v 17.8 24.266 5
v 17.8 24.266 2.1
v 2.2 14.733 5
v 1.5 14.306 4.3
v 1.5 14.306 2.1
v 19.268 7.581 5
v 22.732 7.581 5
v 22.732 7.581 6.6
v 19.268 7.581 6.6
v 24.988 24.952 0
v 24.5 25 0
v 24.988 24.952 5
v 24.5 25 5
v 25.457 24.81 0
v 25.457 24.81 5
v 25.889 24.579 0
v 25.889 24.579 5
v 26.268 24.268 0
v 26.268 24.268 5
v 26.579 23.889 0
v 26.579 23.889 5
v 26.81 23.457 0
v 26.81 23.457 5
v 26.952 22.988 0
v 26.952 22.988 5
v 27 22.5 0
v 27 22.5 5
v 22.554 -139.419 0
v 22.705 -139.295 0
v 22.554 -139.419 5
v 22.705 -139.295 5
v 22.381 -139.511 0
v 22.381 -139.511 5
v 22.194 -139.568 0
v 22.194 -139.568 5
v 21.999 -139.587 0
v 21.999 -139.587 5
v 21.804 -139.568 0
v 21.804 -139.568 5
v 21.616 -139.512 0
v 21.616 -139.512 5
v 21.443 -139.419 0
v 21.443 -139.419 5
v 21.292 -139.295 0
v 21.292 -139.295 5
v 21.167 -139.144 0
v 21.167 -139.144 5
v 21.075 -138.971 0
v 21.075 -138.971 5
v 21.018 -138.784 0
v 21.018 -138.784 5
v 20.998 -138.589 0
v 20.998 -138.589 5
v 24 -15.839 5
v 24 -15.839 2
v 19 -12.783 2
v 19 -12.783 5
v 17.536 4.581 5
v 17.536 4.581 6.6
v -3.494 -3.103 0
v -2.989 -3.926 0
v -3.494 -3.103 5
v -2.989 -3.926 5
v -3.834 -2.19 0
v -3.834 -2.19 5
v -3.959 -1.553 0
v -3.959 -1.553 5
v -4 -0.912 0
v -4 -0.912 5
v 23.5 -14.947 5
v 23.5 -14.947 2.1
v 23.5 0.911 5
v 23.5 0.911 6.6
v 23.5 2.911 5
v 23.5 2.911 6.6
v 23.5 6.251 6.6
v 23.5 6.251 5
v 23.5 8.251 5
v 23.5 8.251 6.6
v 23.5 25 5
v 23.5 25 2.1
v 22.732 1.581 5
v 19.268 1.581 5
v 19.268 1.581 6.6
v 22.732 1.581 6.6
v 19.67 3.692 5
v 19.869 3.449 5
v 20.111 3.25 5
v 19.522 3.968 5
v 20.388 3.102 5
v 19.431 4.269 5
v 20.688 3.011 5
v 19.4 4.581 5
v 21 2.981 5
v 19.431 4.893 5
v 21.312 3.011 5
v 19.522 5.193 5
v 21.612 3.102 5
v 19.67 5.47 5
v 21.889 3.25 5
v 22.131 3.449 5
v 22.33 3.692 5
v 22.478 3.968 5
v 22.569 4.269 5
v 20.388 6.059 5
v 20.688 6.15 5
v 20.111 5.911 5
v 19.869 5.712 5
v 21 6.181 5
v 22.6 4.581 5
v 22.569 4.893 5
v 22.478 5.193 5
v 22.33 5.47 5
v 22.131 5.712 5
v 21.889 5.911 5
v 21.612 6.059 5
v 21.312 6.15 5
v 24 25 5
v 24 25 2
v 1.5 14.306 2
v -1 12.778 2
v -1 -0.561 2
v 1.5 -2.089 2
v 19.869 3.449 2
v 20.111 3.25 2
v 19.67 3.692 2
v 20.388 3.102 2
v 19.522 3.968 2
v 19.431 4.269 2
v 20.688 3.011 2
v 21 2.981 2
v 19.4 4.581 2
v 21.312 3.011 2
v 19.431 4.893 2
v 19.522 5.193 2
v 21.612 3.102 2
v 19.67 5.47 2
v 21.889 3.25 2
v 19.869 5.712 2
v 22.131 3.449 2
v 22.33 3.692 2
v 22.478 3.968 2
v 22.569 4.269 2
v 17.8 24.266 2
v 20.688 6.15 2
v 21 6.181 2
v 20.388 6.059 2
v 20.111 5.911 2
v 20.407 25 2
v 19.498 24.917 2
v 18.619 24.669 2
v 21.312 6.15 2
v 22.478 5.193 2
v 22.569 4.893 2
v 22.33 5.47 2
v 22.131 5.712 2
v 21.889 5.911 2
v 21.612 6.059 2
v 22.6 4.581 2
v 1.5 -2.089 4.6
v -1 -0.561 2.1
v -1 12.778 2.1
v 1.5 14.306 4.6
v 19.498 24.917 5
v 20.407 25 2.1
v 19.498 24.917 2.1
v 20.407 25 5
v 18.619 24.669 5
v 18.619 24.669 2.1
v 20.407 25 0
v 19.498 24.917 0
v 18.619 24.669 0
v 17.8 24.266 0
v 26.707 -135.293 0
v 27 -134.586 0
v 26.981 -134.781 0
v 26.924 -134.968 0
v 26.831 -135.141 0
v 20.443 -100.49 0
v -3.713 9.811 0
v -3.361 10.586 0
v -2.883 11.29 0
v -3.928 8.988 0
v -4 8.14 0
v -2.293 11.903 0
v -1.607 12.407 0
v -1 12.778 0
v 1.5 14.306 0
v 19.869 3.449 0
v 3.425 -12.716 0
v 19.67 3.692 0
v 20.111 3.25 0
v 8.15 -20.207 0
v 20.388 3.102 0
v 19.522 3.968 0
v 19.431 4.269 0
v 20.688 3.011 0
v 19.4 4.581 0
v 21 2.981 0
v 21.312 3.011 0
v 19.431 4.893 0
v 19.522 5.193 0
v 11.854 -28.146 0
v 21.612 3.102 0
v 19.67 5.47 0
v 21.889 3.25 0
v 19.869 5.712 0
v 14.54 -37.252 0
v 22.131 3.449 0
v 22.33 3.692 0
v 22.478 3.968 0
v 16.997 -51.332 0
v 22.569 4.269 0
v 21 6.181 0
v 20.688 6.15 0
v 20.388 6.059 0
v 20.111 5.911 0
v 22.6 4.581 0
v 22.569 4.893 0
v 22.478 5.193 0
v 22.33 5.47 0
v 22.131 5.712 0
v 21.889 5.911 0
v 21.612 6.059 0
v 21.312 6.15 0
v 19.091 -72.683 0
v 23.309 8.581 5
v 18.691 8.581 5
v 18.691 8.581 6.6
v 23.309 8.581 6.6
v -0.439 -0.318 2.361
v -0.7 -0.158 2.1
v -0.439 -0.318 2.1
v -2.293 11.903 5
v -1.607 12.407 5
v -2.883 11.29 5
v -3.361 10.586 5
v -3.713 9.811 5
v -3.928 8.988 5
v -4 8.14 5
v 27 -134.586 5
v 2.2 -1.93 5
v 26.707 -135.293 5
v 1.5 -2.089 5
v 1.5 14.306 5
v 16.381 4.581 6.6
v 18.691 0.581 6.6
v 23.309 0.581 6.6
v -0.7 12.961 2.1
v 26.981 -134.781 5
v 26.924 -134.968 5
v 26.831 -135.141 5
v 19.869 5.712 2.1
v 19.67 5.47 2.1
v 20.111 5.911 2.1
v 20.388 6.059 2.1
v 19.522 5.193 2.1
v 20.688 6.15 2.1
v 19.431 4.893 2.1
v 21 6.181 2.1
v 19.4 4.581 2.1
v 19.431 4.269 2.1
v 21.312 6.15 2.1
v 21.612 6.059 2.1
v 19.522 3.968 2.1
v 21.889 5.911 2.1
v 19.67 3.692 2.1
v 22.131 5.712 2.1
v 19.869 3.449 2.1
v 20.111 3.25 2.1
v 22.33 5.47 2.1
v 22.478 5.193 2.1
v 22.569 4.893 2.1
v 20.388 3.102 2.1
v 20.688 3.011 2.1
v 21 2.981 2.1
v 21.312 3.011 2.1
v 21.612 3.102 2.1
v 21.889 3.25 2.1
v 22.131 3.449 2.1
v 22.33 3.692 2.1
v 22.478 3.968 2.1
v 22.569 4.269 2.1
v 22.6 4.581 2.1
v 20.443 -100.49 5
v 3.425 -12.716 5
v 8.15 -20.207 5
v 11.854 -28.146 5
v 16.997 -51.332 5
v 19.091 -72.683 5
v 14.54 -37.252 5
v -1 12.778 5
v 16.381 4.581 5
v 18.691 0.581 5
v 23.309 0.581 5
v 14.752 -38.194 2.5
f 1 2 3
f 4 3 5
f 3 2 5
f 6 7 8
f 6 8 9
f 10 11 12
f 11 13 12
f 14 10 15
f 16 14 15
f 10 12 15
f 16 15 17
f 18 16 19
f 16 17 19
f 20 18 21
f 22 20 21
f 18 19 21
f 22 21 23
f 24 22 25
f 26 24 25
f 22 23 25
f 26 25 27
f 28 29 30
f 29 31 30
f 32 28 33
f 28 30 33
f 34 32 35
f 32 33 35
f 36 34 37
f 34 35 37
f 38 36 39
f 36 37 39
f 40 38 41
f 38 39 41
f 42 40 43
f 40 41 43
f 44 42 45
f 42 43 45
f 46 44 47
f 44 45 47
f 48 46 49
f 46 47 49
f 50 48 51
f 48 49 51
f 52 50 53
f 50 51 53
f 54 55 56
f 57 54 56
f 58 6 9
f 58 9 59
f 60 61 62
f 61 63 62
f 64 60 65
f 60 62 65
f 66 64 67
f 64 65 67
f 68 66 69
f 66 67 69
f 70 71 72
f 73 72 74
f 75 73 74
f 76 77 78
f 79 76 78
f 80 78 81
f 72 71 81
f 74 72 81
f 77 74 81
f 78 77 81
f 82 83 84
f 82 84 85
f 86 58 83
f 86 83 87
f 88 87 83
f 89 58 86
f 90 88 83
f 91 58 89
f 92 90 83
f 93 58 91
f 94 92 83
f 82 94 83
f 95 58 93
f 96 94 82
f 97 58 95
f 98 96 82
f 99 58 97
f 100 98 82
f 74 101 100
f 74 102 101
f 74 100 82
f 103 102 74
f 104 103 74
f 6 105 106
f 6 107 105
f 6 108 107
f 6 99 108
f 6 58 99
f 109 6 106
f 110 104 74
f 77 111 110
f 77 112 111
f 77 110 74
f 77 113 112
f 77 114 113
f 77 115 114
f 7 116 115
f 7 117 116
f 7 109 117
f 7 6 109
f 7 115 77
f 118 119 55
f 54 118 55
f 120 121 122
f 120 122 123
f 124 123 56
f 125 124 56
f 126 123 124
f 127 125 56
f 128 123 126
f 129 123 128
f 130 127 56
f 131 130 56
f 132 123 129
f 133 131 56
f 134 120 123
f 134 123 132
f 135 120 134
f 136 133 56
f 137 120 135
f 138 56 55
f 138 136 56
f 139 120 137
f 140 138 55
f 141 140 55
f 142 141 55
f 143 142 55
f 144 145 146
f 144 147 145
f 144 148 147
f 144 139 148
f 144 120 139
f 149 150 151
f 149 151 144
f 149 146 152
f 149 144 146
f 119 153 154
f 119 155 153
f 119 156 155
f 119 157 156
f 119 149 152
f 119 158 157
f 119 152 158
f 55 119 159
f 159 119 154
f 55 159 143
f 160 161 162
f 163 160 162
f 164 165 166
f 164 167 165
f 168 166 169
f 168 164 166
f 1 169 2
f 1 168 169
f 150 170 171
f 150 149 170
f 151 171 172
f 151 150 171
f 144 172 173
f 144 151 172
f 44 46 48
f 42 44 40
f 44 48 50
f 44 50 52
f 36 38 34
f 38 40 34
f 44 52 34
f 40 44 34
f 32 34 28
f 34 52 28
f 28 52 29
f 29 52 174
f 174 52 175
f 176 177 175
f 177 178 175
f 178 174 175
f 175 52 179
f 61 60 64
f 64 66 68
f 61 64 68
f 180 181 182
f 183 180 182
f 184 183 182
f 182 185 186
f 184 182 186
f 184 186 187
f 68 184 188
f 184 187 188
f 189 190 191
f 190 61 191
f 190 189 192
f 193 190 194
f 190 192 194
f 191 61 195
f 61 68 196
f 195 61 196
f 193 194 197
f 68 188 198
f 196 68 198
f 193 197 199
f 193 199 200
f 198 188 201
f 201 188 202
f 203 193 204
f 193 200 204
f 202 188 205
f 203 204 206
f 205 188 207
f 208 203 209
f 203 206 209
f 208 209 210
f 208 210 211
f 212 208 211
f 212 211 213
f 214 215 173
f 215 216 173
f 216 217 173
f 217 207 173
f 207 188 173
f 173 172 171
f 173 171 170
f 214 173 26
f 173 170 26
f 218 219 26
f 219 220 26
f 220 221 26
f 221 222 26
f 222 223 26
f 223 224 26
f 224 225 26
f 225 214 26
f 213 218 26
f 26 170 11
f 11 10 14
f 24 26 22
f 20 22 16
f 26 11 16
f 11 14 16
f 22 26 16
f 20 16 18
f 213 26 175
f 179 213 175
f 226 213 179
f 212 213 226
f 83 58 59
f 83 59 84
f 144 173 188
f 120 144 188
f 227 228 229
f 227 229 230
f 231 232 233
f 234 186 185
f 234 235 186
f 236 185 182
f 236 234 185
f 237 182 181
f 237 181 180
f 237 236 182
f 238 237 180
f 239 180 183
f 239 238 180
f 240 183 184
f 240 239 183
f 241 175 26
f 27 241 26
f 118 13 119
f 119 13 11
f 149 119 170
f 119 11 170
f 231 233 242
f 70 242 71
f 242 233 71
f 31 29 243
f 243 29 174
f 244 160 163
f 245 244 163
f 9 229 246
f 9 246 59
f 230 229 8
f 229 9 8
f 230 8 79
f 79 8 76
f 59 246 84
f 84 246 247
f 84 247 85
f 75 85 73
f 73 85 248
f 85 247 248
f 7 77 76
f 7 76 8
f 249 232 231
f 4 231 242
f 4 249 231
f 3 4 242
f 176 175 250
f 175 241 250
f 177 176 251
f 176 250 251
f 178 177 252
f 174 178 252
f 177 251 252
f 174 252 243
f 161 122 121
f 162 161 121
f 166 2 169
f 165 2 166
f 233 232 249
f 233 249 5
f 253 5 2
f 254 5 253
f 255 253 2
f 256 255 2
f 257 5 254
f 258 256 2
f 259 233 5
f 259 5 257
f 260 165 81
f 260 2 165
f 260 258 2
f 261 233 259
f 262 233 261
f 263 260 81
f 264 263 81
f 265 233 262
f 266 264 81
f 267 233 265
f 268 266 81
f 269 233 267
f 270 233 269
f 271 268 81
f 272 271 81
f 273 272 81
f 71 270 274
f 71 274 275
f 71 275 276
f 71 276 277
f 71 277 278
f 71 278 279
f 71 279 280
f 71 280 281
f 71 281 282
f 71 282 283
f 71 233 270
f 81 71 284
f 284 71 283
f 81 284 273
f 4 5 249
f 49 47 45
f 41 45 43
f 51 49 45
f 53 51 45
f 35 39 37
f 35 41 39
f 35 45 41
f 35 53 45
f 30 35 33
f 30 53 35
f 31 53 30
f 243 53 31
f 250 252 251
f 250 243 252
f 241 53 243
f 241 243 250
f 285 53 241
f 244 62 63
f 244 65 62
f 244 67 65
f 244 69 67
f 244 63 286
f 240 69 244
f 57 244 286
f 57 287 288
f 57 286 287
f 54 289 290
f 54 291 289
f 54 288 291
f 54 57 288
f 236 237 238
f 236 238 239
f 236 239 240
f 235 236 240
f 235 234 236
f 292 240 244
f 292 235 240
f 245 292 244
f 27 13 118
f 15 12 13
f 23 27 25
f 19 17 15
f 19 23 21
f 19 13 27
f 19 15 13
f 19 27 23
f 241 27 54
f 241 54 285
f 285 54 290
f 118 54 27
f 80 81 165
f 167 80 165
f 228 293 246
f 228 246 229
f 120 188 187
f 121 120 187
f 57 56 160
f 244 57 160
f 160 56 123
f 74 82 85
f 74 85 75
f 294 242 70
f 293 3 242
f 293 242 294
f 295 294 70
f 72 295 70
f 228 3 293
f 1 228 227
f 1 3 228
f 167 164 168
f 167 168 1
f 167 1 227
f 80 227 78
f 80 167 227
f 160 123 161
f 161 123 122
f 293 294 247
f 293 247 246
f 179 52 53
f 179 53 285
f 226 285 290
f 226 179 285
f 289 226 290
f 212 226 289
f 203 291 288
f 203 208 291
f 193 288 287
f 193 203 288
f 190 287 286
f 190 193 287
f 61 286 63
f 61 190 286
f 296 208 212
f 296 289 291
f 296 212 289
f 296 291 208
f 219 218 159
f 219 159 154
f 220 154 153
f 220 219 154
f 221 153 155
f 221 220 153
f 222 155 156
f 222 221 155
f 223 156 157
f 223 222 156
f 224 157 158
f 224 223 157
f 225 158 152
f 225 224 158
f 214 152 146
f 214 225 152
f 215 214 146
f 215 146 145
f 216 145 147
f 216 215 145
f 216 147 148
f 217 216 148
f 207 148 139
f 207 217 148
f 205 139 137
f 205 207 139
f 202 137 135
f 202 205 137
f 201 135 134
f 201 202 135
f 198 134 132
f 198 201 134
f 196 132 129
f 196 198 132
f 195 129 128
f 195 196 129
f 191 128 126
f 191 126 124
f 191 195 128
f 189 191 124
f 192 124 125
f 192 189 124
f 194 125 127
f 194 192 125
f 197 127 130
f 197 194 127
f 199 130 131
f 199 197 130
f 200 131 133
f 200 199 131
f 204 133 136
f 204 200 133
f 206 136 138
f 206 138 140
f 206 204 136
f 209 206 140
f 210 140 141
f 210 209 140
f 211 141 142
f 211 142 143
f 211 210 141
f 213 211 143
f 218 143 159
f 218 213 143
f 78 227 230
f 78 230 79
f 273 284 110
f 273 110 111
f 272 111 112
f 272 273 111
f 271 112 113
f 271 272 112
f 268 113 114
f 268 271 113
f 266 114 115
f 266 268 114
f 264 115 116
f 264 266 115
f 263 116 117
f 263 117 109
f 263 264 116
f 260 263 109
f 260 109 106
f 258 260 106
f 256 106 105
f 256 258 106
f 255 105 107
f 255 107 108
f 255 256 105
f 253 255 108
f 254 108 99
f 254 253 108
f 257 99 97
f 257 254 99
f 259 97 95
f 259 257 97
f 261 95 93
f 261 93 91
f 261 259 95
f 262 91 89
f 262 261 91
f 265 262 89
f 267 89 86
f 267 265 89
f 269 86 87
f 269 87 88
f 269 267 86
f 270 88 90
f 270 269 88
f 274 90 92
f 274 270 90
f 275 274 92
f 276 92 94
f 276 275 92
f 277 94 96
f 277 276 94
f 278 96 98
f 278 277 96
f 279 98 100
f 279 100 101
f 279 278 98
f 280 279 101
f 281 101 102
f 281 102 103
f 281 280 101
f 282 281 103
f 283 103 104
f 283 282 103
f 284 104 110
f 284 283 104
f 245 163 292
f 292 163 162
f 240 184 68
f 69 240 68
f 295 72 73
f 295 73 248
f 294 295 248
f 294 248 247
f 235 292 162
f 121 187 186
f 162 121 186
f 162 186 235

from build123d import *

# Parameters (mm, degrees)
F0_R        = 1.6
F1_DEPTH    = 2
F2_DEPTH    = 5
F3_START    = 2.1
F3_DEPTH    = 2.9
F4_SIZE     = 2.49999
F5_R        = 5
F6_R        = 2.5
F7_R        = 1
F8_START    = 2.1
F8_DEPTH    = 2.9
F9_T1_DEPTH = 29.797383518
F11_DEPTH   = 2.9
F12_DEPTH   = 4.5
F13_R       = 5


# Not quite as in the source:
# - a fillet or chamfer that OpenCascade refuses, or shapes differently, is made with other operations: its cross-section is extruded or revolved along the edge and cut away or added
# - a fillet or chamfer is up to 0.001 mm smaller than in the source, because OpenCascade refuses the exact size


with BuildPart() as f1:
    # F0 (on Top) → F1 (new body)
    with BuildSketch(Plane.XY):
        Polygon((1.5, 14.3055555556), (1.5, -2.088612395), (19, -12.7830568394), (24, -15.838612395), (24, 25), (19, 25), align=None)
        with Locations((21, 4.5806938025)):
            Circle(F0_R, mode=Mode.SUBTRACT)
        Polygon((-1, 12.7777777778), (-1, -0.5608346172), (1.5, -2.088612395), (1.5, 14.3055555556), align=None)
    extrude(amount=F1_DEPTH)

    # F0 (on Top) → F2 (join)
    with BuildSketch(Plane.XY):
        with BuildLine():
            Line((1.5, -2.088612395), (-1, -0.5608346172))
            Line((-1, -0.5608346172), (-1, 12.7777777778))
            Line((-1, 12.7777777778), (-4, 10.9444444444))
            Line((-4, 10.9444444444), (-4, -2.5923480172))
            add(Edge.make_bspline(
                [(21, -141), (21, -99.5346466722), (18.6902447603, -35.5134267653), (7.388175394, -17.5804150979), (-4, -2.5923480172)],
                knots=[0, 0, 0, 0, 0.6153681888, 1, 1, 1, 1], degree=3))
            Line((21, -141), (27, -135))
            Line((27, -135), (27, 25))
            Line((27, 25), (24, 25))
            Line((24, 25), (24, -15.838612395))
            Line((24, -15.838612395), (19, -12.7830568394))
            Line((19, -12.7830568394), (1.5, -2.088612395))
        make_face()
    extrude(amount=F2_DEPTH)

    # F0 (on Top) → F3 (join)
    with BuildSketch(Plane.XY.offset(F3_START)):
        Polygon((-1, 12.7777777778), (-1, -0.5608346172), (1.5, -2.088612395), (1.5, 14.3055555556), align=None)
    extrude(amount=F3_DEPTH)

    # F4 (size 2.5 in the source; OpenCascade refuses exactly that, so slightly less here)
    f4_edges = [f1.edges().sort_by_distance(p)[0] for p in [
        (1.5, 6.108472, 2.1),
    ]]
    chamfer(f4_edges, length=F4_SIZE)

    # F5
    f5_edges = [f1.edges().sort_by_distance(p)[0] for p in [
        (-4, 10.944444, 2.5),
        (19, 25, 1),
        (-4, -2.592348, 2.5),
    ]]
    fillet(f5_edges, radius=F5_R)

    # F6
    f6_edges = [f1.edges().sort_by_distance(p)[0] for p in [
        (27, 25, 2.5),
    ]]
    fillet(f6_edges, radius=F6_R)

    # F7
    f7_edges = [f1.edges().sort_by_distance(p)[0] for p in [
        (27, -135, 2.5),
        (21, -141, 2.5),
    ]]
    fillet(f7_edges, radius=F7_R)


with BuildPart() as f8:
    # F0 (on Top) → F8 (new body)
    with BuildSketch(Plane.XY.offset(F8_START)):
        Polygon((-1, 12.7777777778), (-1, -0.5608346172), (1.5, -2.088612395), (1.5, 14.3055555556), align=None)
        Polygon((1.5, 14.3055555556), (1.5, -2.088612395), (19, -12.7830568394), (24, -15.838612395), (24, 25), (19, 25), align=None)
        with Locations((21, 4.5806938025)):
            Circle(F0_R, mode=Mode.SUBTRACT)
    extrude(amount=F8_DEPTH)

    # F9: chamfer of 3.2 on 1 edges, made by hand

    # F9_s2 → F9_t1 (cut)
    with BuildSketch(Plane.XZ.offset(-21.0071633393)):
        Polygon((-1, 1.8), (2.2, 5), (-1, 5), align=None)
    extrude(amount=F9_T1_DEPTH, mode=Mode.SUBTRACT)

    # F10 (on face) → F11 (cut, through all)
    with BuildSketch(Plane(origin=(0, 0, 2.1), x_dir=(1, 0, 0), z_dir=(0, 0, -1))):
        Polygon((24, -1.7768462252), (24, 15.838612395), (-0.7, 0.7441679505), (-0.7, 0.1581950864), (-0.4392749953, 0.3175270337), (23.5, 14.9470839753), (23.5, -0.9108208214), align=None)
        Polygon((24, -25), (24, -7.3845413798), (23.5, -8.2505667836), (23.5, -25), align=None)
        Polygon((24, -3.7768462252), (24, -1.7768462252), (23.5, -0.9108208214), (23.5, -2.9108208214), align=None)
        Polygon((24, -7.3845413798), (24, -5.3845413798), (23.5, -6.2505667836), (23.5, -8.2505667836), align=None)
        Polygon((24, -5.3845413798), (24, -3.7768462252), (23.5, -2.9108208214), (23.5, -6.2505667836), align=None)
    extrude(amount=-F11_DEPTH, mode=Mode.SUBTRACT)

    # F10 (on face) → F12 (join)
    with BuildSketch(Plane(origin=(0, 0, 2.1), x_dir=(1, 0, 0), z_dir=(0, 0, -1))):
        Polygon((23.5, -2.9108208214), (23.5, -0.9108208214), (23.3094010768, -0.5806938025), (18.6905989232, -0.5806938025), (16.3811978465, -4.5806938025), (18.6905989232, -8.5806938025), (23.3094010768, -8.5806938025), (23.5, -8.2505667836), (23.5, -6.2505667836), (22.7320508076, -7.5806938025), (19.2679491924, -7.5806938025), (17.5358983849, -4.5806938025), (19.2679491924, -1.5806938025), (22.7320508076, -1.5806938025), align=None)
    extrude(amount=-F12_DEPTH)

    # F13
    f13_edges = [f8.edges().sort_by_distance(p)[0] for p in [
        (19, 25, 3.55),
    ]]
    fillet(f13_edges, radius=F13_R)


solid = Compound([f1.part, f8.part])
